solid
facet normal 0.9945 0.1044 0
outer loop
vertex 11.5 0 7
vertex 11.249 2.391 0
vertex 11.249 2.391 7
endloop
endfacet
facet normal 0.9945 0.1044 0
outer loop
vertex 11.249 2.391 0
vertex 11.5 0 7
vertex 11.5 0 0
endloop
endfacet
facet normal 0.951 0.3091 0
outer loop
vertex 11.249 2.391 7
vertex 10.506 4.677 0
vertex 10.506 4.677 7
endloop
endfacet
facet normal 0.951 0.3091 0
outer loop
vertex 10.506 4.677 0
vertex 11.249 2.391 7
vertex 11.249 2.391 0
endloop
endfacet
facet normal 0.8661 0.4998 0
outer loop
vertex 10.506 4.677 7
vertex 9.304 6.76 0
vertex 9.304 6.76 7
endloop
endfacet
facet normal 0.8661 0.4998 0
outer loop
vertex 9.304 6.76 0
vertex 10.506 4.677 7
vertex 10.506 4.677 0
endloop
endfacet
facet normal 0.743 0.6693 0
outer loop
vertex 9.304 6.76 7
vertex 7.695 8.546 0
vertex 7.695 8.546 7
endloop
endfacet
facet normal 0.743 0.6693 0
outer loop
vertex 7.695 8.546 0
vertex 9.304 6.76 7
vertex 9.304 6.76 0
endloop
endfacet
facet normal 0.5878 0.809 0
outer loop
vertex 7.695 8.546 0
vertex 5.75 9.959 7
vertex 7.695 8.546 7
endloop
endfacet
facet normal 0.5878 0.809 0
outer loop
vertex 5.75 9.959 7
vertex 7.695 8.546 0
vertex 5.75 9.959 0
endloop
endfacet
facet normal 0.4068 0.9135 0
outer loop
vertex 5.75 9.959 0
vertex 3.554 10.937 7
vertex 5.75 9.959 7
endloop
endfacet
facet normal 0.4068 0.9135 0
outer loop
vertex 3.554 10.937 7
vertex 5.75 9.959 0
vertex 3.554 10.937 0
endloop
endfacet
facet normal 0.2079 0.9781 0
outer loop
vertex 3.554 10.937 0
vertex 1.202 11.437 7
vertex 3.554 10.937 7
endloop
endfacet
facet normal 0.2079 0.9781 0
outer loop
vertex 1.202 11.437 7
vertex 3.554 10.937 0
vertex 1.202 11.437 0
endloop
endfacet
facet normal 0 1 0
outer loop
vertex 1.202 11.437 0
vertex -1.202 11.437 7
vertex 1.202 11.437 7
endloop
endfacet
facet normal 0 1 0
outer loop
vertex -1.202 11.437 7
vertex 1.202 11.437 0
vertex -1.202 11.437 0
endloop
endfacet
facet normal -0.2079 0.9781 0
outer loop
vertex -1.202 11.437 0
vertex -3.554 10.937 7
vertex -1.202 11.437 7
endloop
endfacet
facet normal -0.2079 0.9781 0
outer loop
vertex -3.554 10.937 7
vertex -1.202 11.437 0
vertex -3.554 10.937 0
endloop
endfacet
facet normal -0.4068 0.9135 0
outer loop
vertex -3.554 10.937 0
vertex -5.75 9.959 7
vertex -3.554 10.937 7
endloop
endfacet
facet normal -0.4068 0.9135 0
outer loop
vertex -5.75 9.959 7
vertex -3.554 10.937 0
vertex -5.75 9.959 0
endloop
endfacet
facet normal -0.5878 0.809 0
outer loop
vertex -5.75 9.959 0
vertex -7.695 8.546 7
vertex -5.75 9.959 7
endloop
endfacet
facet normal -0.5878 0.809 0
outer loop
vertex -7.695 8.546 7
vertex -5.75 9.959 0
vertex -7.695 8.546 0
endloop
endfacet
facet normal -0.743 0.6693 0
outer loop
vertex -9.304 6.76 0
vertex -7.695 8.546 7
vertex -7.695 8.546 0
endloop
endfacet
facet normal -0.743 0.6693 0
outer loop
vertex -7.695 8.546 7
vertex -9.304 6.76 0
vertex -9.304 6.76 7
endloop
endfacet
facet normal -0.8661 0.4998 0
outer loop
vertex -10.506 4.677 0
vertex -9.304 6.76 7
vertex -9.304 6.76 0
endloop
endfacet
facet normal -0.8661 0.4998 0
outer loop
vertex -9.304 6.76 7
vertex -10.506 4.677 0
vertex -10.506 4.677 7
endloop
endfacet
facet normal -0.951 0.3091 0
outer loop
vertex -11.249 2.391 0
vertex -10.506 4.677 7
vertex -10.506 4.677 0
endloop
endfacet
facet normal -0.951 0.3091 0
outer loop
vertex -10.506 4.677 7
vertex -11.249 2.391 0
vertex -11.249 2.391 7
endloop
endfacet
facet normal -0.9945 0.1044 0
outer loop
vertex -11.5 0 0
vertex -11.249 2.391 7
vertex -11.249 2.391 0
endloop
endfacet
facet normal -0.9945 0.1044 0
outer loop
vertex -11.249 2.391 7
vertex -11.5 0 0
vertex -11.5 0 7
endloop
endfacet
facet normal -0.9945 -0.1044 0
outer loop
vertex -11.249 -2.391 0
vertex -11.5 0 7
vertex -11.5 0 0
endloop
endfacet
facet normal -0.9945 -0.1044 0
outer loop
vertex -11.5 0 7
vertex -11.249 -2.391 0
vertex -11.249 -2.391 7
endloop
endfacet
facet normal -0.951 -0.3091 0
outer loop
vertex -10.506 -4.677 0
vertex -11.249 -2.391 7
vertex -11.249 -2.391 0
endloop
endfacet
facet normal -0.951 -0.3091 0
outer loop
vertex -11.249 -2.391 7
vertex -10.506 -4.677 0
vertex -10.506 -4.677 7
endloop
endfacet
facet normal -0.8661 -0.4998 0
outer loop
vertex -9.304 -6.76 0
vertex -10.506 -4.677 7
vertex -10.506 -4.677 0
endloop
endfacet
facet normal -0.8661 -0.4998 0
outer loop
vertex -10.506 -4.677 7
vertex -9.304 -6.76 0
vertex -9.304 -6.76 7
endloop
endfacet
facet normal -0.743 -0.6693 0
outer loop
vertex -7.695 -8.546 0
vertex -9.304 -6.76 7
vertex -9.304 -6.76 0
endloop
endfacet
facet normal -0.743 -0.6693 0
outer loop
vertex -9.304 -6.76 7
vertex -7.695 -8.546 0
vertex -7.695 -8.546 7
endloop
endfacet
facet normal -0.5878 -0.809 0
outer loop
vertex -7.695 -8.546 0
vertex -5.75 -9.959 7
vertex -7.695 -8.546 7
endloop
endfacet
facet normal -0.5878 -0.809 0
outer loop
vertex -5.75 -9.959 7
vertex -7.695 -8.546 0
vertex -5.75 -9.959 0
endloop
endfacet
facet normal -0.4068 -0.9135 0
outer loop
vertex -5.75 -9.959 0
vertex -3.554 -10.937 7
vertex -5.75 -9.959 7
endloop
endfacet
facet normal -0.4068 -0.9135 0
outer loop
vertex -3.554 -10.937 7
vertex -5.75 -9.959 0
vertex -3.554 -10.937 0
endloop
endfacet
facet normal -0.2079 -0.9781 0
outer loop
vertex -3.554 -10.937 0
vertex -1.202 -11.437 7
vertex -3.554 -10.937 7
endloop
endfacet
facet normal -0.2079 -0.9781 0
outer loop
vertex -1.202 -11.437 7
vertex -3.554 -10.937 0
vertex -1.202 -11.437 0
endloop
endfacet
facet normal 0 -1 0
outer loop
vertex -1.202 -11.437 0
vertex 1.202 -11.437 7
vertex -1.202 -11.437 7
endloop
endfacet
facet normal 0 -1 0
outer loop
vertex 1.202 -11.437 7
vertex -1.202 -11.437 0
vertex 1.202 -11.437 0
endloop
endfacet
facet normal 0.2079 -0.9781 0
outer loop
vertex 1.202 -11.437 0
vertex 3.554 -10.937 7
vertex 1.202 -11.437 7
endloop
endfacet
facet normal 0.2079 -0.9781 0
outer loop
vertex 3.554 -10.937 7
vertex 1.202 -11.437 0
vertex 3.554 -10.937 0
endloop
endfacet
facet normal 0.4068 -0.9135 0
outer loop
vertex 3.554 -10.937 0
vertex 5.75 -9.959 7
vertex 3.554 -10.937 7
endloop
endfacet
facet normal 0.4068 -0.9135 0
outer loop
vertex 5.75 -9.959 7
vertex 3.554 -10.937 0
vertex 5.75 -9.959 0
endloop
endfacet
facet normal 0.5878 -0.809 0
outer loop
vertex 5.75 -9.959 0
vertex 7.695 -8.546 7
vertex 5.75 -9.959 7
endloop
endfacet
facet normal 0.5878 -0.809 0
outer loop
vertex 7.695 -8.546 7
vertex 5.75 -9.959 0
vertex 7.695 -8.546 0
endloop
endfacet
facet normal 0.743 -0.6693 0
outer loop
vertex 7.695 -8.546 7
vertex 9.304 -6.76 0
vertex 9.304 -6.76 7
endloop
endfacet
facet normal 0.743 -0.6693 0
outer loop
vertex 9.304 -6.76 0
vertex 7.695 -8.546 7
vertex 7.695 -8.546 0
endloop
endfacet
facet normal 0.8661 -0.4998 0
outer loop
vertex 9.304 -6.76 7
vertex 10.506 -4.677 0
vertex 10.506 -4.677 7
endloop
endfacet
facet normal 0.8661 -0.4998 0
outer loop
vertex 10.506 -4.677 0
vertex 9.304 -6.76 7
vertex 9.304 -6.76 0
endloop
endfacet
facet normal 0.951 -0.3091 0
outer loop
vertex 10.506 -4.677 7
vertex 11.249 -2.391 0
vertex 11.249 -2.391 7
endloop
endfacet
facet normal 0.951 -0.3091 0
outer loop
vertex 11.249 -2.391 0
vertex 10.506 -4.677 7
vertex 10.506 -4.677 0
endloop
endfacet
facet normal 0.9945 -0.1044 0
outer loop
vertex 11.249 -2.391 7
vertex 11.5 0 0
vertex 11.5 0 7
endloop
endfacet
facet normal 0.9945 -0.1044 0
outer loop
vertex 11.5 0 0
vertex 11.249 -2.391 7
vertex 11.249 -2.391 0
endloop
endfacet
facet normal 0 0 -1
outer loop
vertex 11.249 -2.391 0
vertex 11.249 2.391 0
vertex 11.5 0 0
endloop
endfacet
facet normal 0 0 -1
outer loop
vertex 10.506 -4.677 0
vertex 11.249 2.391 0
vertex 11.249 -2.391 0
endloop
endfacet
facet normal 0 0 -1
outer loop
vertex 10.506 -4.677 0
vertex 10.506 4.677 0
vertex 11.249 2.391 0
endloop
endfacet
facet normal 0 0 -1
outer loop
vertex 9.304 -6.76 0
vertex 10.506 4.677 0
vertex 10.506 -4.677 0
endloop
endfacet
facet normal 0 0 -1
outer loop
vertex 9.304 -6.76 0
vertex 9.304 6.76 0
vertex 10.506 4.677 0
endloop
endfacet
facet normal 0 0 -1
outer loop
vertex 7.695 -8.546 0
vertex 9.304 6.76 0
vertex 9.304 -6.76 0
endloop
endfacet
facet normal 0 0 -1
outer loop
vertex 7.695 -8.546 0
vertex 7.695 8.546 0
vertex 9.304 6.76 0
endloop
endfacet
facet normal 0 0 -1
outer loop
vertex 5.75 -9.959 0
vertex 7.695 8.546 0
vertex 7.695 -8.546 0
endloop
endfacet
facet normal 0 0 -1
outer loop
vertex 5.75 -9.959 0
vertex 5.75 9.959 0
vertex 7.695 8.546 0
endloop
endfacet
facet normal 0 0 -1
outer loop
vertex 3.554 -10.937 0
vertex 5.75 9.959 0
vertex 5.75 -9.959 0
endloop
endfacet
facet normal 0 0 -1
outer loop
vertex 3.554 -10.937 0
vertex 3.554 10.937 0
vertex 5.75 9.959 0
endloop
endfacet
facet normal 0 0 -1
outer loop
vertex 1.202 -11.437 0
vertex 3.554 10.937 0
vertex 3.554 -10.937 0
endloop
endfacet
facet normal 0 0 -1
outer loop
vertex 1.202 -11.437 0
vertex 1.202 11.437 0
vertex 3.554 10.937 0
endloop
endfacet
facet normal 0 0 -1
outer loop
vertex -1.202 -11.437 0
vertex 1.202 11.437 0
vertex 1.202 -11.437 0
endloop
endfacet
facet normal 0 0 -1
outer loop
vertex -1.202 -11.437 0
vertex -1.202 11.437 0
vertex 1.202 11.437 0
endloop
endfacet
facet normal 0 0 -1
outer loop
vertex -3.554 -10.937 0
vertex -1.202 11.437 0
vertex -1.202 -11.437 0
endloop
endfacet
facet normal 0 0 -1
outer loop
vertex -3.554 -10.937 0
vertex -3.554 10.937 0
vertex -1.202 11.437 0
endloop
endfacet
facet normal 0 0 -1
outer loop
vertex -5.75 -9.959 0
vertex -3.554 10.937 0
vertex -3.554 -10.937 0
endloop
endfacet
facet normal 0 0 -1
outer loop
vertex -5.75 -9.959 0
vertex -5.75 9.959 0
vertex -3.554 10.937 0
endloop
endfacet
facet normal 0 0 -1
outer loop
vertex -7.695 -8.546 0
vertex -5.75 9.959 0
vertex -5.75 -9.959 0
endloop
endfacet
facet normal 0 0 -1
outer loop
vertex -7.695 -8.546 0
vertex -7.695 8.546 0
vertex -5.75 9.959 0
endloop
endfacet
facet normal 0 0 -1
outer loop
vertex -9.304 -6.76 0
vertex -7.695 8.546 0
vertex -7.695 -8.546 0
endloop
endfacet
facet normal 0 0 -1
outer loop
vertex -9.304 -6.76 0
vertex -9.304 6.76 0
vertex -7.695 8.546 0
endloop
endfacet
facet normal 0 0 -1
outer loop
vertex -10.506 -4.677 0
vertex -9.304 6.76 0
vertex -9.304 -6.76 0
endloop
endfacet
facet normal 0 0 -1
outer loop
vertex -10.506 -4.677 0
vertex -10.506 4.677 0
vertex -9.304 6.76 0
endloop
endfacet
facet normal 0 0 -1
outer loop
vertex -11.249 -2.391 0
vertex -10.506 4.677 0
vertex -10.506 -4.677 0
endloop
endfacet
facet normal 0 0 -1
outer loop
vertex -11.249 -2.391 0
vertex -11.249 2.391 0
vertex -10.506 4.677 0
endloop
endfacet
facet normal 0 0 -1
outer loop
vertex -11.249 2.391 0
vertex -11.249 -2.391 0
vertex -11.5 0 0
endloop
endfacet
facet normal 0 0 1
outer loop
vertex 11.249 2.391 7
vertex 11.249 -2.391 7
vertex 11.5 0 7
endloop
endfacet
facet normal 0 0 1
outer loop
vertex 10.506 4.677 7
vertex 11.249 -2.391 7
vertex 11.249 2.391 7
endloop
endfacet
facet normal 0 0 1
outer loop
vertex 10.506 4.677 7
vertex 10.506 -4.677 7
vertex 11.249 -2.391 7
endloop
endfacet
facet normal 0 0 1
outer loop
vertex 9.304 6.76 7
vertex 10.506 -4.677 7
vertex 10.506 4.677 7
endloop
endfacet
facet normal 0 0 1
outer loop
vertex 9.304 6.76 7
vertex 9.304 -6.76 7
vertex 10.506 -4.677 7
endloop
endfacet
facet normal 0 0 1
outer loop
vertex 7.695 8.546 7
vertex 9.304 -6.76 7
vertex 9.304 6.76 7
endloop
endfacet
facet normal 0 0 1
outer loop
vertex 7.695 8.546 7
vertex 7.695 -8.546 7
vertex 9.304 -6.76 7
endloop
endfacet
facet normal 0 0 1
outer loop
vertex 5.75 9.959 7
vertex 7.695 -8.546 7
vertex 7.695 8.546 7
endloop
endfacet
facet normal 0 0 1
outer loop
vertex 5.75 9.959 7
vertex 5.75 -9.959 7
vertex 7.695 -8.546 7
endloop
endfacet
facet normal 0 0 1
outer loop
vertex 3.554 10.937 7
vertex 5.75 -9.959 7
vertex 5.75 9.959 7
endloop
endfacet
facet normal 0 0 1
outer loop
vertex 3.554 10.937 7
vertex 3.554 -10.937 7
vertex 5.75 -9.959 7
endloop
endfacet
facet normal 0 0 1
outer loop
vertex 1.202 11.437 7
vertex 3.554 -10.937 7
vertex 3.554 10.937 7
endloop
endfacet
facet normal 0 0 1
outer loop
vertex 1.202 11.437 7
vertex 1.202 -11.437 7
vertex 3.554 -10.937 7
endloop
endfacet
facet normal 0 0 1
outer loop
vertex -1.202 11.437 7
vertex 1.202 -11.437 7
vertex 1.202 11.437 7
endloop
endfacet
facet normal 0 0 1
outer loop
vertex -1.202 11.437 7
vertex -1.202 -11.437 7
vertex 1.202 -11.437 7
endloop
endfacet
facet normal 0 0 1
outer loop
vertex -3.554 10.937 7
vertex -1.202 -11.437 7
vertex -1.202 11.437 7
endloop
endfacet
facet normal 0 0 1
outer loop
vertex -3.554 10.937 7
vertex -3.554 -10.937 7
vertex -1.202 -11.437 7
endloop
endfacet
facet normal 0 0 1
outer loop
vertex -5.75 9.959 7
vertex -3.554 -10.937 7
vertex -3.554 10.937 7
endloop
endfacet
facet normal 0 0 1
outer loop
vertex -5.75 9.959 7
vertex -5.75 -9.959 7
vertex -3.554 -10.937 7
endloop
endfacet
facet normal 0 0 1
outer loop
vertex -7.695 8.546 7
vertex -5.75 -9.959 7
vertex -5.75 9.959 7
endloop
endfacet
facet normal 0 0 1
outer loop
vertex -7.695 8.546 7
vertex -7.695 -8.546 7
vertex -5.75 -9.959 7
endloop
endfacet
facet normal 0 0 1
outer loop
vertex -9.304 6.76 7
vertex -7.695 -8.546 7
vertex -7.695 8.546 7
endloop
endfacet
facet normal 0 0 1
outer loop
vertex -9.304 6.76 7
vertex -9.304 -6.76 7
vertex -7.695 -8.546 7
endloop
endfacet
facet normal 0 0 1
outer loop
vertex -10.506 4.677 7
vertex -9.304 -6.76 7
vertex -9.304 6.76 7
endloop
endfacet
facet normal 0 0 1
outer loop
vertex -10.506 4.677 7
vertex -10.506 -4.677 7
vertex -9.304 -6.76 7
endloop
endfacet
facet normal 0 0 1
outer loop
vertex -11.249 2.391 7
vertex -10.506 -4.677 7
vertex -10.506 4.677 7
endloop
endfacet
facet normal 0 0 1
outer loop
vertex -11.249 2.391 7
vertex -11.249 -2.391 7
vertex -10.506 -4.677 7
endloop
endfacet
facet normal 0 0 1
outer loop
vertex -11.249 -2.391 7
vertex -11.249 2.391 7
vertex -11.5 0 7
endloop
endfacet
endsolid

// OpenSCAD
toothcount=floor(22*3.141592653589793/2);
difference(){
	cylinder(r=(22+1)/2,h=7)
	render() intersection(){
		difference(){
			cylinder(r=(22+1)/2,h=7);
			cylinder(r=22/2,h=20,center=true);
		}
		translate([0,0,7/2]){
			for(i=[1:toothcount]) rotate([0,0,(360/toothcount)*i])
			for(j=[-1,1]) translate([22/2,0,8/4*j]) rotate([45*j,0,0]) cube([25,0.7071067811865475,9/1.4142135623730951],center=true);
		}
	}
}
